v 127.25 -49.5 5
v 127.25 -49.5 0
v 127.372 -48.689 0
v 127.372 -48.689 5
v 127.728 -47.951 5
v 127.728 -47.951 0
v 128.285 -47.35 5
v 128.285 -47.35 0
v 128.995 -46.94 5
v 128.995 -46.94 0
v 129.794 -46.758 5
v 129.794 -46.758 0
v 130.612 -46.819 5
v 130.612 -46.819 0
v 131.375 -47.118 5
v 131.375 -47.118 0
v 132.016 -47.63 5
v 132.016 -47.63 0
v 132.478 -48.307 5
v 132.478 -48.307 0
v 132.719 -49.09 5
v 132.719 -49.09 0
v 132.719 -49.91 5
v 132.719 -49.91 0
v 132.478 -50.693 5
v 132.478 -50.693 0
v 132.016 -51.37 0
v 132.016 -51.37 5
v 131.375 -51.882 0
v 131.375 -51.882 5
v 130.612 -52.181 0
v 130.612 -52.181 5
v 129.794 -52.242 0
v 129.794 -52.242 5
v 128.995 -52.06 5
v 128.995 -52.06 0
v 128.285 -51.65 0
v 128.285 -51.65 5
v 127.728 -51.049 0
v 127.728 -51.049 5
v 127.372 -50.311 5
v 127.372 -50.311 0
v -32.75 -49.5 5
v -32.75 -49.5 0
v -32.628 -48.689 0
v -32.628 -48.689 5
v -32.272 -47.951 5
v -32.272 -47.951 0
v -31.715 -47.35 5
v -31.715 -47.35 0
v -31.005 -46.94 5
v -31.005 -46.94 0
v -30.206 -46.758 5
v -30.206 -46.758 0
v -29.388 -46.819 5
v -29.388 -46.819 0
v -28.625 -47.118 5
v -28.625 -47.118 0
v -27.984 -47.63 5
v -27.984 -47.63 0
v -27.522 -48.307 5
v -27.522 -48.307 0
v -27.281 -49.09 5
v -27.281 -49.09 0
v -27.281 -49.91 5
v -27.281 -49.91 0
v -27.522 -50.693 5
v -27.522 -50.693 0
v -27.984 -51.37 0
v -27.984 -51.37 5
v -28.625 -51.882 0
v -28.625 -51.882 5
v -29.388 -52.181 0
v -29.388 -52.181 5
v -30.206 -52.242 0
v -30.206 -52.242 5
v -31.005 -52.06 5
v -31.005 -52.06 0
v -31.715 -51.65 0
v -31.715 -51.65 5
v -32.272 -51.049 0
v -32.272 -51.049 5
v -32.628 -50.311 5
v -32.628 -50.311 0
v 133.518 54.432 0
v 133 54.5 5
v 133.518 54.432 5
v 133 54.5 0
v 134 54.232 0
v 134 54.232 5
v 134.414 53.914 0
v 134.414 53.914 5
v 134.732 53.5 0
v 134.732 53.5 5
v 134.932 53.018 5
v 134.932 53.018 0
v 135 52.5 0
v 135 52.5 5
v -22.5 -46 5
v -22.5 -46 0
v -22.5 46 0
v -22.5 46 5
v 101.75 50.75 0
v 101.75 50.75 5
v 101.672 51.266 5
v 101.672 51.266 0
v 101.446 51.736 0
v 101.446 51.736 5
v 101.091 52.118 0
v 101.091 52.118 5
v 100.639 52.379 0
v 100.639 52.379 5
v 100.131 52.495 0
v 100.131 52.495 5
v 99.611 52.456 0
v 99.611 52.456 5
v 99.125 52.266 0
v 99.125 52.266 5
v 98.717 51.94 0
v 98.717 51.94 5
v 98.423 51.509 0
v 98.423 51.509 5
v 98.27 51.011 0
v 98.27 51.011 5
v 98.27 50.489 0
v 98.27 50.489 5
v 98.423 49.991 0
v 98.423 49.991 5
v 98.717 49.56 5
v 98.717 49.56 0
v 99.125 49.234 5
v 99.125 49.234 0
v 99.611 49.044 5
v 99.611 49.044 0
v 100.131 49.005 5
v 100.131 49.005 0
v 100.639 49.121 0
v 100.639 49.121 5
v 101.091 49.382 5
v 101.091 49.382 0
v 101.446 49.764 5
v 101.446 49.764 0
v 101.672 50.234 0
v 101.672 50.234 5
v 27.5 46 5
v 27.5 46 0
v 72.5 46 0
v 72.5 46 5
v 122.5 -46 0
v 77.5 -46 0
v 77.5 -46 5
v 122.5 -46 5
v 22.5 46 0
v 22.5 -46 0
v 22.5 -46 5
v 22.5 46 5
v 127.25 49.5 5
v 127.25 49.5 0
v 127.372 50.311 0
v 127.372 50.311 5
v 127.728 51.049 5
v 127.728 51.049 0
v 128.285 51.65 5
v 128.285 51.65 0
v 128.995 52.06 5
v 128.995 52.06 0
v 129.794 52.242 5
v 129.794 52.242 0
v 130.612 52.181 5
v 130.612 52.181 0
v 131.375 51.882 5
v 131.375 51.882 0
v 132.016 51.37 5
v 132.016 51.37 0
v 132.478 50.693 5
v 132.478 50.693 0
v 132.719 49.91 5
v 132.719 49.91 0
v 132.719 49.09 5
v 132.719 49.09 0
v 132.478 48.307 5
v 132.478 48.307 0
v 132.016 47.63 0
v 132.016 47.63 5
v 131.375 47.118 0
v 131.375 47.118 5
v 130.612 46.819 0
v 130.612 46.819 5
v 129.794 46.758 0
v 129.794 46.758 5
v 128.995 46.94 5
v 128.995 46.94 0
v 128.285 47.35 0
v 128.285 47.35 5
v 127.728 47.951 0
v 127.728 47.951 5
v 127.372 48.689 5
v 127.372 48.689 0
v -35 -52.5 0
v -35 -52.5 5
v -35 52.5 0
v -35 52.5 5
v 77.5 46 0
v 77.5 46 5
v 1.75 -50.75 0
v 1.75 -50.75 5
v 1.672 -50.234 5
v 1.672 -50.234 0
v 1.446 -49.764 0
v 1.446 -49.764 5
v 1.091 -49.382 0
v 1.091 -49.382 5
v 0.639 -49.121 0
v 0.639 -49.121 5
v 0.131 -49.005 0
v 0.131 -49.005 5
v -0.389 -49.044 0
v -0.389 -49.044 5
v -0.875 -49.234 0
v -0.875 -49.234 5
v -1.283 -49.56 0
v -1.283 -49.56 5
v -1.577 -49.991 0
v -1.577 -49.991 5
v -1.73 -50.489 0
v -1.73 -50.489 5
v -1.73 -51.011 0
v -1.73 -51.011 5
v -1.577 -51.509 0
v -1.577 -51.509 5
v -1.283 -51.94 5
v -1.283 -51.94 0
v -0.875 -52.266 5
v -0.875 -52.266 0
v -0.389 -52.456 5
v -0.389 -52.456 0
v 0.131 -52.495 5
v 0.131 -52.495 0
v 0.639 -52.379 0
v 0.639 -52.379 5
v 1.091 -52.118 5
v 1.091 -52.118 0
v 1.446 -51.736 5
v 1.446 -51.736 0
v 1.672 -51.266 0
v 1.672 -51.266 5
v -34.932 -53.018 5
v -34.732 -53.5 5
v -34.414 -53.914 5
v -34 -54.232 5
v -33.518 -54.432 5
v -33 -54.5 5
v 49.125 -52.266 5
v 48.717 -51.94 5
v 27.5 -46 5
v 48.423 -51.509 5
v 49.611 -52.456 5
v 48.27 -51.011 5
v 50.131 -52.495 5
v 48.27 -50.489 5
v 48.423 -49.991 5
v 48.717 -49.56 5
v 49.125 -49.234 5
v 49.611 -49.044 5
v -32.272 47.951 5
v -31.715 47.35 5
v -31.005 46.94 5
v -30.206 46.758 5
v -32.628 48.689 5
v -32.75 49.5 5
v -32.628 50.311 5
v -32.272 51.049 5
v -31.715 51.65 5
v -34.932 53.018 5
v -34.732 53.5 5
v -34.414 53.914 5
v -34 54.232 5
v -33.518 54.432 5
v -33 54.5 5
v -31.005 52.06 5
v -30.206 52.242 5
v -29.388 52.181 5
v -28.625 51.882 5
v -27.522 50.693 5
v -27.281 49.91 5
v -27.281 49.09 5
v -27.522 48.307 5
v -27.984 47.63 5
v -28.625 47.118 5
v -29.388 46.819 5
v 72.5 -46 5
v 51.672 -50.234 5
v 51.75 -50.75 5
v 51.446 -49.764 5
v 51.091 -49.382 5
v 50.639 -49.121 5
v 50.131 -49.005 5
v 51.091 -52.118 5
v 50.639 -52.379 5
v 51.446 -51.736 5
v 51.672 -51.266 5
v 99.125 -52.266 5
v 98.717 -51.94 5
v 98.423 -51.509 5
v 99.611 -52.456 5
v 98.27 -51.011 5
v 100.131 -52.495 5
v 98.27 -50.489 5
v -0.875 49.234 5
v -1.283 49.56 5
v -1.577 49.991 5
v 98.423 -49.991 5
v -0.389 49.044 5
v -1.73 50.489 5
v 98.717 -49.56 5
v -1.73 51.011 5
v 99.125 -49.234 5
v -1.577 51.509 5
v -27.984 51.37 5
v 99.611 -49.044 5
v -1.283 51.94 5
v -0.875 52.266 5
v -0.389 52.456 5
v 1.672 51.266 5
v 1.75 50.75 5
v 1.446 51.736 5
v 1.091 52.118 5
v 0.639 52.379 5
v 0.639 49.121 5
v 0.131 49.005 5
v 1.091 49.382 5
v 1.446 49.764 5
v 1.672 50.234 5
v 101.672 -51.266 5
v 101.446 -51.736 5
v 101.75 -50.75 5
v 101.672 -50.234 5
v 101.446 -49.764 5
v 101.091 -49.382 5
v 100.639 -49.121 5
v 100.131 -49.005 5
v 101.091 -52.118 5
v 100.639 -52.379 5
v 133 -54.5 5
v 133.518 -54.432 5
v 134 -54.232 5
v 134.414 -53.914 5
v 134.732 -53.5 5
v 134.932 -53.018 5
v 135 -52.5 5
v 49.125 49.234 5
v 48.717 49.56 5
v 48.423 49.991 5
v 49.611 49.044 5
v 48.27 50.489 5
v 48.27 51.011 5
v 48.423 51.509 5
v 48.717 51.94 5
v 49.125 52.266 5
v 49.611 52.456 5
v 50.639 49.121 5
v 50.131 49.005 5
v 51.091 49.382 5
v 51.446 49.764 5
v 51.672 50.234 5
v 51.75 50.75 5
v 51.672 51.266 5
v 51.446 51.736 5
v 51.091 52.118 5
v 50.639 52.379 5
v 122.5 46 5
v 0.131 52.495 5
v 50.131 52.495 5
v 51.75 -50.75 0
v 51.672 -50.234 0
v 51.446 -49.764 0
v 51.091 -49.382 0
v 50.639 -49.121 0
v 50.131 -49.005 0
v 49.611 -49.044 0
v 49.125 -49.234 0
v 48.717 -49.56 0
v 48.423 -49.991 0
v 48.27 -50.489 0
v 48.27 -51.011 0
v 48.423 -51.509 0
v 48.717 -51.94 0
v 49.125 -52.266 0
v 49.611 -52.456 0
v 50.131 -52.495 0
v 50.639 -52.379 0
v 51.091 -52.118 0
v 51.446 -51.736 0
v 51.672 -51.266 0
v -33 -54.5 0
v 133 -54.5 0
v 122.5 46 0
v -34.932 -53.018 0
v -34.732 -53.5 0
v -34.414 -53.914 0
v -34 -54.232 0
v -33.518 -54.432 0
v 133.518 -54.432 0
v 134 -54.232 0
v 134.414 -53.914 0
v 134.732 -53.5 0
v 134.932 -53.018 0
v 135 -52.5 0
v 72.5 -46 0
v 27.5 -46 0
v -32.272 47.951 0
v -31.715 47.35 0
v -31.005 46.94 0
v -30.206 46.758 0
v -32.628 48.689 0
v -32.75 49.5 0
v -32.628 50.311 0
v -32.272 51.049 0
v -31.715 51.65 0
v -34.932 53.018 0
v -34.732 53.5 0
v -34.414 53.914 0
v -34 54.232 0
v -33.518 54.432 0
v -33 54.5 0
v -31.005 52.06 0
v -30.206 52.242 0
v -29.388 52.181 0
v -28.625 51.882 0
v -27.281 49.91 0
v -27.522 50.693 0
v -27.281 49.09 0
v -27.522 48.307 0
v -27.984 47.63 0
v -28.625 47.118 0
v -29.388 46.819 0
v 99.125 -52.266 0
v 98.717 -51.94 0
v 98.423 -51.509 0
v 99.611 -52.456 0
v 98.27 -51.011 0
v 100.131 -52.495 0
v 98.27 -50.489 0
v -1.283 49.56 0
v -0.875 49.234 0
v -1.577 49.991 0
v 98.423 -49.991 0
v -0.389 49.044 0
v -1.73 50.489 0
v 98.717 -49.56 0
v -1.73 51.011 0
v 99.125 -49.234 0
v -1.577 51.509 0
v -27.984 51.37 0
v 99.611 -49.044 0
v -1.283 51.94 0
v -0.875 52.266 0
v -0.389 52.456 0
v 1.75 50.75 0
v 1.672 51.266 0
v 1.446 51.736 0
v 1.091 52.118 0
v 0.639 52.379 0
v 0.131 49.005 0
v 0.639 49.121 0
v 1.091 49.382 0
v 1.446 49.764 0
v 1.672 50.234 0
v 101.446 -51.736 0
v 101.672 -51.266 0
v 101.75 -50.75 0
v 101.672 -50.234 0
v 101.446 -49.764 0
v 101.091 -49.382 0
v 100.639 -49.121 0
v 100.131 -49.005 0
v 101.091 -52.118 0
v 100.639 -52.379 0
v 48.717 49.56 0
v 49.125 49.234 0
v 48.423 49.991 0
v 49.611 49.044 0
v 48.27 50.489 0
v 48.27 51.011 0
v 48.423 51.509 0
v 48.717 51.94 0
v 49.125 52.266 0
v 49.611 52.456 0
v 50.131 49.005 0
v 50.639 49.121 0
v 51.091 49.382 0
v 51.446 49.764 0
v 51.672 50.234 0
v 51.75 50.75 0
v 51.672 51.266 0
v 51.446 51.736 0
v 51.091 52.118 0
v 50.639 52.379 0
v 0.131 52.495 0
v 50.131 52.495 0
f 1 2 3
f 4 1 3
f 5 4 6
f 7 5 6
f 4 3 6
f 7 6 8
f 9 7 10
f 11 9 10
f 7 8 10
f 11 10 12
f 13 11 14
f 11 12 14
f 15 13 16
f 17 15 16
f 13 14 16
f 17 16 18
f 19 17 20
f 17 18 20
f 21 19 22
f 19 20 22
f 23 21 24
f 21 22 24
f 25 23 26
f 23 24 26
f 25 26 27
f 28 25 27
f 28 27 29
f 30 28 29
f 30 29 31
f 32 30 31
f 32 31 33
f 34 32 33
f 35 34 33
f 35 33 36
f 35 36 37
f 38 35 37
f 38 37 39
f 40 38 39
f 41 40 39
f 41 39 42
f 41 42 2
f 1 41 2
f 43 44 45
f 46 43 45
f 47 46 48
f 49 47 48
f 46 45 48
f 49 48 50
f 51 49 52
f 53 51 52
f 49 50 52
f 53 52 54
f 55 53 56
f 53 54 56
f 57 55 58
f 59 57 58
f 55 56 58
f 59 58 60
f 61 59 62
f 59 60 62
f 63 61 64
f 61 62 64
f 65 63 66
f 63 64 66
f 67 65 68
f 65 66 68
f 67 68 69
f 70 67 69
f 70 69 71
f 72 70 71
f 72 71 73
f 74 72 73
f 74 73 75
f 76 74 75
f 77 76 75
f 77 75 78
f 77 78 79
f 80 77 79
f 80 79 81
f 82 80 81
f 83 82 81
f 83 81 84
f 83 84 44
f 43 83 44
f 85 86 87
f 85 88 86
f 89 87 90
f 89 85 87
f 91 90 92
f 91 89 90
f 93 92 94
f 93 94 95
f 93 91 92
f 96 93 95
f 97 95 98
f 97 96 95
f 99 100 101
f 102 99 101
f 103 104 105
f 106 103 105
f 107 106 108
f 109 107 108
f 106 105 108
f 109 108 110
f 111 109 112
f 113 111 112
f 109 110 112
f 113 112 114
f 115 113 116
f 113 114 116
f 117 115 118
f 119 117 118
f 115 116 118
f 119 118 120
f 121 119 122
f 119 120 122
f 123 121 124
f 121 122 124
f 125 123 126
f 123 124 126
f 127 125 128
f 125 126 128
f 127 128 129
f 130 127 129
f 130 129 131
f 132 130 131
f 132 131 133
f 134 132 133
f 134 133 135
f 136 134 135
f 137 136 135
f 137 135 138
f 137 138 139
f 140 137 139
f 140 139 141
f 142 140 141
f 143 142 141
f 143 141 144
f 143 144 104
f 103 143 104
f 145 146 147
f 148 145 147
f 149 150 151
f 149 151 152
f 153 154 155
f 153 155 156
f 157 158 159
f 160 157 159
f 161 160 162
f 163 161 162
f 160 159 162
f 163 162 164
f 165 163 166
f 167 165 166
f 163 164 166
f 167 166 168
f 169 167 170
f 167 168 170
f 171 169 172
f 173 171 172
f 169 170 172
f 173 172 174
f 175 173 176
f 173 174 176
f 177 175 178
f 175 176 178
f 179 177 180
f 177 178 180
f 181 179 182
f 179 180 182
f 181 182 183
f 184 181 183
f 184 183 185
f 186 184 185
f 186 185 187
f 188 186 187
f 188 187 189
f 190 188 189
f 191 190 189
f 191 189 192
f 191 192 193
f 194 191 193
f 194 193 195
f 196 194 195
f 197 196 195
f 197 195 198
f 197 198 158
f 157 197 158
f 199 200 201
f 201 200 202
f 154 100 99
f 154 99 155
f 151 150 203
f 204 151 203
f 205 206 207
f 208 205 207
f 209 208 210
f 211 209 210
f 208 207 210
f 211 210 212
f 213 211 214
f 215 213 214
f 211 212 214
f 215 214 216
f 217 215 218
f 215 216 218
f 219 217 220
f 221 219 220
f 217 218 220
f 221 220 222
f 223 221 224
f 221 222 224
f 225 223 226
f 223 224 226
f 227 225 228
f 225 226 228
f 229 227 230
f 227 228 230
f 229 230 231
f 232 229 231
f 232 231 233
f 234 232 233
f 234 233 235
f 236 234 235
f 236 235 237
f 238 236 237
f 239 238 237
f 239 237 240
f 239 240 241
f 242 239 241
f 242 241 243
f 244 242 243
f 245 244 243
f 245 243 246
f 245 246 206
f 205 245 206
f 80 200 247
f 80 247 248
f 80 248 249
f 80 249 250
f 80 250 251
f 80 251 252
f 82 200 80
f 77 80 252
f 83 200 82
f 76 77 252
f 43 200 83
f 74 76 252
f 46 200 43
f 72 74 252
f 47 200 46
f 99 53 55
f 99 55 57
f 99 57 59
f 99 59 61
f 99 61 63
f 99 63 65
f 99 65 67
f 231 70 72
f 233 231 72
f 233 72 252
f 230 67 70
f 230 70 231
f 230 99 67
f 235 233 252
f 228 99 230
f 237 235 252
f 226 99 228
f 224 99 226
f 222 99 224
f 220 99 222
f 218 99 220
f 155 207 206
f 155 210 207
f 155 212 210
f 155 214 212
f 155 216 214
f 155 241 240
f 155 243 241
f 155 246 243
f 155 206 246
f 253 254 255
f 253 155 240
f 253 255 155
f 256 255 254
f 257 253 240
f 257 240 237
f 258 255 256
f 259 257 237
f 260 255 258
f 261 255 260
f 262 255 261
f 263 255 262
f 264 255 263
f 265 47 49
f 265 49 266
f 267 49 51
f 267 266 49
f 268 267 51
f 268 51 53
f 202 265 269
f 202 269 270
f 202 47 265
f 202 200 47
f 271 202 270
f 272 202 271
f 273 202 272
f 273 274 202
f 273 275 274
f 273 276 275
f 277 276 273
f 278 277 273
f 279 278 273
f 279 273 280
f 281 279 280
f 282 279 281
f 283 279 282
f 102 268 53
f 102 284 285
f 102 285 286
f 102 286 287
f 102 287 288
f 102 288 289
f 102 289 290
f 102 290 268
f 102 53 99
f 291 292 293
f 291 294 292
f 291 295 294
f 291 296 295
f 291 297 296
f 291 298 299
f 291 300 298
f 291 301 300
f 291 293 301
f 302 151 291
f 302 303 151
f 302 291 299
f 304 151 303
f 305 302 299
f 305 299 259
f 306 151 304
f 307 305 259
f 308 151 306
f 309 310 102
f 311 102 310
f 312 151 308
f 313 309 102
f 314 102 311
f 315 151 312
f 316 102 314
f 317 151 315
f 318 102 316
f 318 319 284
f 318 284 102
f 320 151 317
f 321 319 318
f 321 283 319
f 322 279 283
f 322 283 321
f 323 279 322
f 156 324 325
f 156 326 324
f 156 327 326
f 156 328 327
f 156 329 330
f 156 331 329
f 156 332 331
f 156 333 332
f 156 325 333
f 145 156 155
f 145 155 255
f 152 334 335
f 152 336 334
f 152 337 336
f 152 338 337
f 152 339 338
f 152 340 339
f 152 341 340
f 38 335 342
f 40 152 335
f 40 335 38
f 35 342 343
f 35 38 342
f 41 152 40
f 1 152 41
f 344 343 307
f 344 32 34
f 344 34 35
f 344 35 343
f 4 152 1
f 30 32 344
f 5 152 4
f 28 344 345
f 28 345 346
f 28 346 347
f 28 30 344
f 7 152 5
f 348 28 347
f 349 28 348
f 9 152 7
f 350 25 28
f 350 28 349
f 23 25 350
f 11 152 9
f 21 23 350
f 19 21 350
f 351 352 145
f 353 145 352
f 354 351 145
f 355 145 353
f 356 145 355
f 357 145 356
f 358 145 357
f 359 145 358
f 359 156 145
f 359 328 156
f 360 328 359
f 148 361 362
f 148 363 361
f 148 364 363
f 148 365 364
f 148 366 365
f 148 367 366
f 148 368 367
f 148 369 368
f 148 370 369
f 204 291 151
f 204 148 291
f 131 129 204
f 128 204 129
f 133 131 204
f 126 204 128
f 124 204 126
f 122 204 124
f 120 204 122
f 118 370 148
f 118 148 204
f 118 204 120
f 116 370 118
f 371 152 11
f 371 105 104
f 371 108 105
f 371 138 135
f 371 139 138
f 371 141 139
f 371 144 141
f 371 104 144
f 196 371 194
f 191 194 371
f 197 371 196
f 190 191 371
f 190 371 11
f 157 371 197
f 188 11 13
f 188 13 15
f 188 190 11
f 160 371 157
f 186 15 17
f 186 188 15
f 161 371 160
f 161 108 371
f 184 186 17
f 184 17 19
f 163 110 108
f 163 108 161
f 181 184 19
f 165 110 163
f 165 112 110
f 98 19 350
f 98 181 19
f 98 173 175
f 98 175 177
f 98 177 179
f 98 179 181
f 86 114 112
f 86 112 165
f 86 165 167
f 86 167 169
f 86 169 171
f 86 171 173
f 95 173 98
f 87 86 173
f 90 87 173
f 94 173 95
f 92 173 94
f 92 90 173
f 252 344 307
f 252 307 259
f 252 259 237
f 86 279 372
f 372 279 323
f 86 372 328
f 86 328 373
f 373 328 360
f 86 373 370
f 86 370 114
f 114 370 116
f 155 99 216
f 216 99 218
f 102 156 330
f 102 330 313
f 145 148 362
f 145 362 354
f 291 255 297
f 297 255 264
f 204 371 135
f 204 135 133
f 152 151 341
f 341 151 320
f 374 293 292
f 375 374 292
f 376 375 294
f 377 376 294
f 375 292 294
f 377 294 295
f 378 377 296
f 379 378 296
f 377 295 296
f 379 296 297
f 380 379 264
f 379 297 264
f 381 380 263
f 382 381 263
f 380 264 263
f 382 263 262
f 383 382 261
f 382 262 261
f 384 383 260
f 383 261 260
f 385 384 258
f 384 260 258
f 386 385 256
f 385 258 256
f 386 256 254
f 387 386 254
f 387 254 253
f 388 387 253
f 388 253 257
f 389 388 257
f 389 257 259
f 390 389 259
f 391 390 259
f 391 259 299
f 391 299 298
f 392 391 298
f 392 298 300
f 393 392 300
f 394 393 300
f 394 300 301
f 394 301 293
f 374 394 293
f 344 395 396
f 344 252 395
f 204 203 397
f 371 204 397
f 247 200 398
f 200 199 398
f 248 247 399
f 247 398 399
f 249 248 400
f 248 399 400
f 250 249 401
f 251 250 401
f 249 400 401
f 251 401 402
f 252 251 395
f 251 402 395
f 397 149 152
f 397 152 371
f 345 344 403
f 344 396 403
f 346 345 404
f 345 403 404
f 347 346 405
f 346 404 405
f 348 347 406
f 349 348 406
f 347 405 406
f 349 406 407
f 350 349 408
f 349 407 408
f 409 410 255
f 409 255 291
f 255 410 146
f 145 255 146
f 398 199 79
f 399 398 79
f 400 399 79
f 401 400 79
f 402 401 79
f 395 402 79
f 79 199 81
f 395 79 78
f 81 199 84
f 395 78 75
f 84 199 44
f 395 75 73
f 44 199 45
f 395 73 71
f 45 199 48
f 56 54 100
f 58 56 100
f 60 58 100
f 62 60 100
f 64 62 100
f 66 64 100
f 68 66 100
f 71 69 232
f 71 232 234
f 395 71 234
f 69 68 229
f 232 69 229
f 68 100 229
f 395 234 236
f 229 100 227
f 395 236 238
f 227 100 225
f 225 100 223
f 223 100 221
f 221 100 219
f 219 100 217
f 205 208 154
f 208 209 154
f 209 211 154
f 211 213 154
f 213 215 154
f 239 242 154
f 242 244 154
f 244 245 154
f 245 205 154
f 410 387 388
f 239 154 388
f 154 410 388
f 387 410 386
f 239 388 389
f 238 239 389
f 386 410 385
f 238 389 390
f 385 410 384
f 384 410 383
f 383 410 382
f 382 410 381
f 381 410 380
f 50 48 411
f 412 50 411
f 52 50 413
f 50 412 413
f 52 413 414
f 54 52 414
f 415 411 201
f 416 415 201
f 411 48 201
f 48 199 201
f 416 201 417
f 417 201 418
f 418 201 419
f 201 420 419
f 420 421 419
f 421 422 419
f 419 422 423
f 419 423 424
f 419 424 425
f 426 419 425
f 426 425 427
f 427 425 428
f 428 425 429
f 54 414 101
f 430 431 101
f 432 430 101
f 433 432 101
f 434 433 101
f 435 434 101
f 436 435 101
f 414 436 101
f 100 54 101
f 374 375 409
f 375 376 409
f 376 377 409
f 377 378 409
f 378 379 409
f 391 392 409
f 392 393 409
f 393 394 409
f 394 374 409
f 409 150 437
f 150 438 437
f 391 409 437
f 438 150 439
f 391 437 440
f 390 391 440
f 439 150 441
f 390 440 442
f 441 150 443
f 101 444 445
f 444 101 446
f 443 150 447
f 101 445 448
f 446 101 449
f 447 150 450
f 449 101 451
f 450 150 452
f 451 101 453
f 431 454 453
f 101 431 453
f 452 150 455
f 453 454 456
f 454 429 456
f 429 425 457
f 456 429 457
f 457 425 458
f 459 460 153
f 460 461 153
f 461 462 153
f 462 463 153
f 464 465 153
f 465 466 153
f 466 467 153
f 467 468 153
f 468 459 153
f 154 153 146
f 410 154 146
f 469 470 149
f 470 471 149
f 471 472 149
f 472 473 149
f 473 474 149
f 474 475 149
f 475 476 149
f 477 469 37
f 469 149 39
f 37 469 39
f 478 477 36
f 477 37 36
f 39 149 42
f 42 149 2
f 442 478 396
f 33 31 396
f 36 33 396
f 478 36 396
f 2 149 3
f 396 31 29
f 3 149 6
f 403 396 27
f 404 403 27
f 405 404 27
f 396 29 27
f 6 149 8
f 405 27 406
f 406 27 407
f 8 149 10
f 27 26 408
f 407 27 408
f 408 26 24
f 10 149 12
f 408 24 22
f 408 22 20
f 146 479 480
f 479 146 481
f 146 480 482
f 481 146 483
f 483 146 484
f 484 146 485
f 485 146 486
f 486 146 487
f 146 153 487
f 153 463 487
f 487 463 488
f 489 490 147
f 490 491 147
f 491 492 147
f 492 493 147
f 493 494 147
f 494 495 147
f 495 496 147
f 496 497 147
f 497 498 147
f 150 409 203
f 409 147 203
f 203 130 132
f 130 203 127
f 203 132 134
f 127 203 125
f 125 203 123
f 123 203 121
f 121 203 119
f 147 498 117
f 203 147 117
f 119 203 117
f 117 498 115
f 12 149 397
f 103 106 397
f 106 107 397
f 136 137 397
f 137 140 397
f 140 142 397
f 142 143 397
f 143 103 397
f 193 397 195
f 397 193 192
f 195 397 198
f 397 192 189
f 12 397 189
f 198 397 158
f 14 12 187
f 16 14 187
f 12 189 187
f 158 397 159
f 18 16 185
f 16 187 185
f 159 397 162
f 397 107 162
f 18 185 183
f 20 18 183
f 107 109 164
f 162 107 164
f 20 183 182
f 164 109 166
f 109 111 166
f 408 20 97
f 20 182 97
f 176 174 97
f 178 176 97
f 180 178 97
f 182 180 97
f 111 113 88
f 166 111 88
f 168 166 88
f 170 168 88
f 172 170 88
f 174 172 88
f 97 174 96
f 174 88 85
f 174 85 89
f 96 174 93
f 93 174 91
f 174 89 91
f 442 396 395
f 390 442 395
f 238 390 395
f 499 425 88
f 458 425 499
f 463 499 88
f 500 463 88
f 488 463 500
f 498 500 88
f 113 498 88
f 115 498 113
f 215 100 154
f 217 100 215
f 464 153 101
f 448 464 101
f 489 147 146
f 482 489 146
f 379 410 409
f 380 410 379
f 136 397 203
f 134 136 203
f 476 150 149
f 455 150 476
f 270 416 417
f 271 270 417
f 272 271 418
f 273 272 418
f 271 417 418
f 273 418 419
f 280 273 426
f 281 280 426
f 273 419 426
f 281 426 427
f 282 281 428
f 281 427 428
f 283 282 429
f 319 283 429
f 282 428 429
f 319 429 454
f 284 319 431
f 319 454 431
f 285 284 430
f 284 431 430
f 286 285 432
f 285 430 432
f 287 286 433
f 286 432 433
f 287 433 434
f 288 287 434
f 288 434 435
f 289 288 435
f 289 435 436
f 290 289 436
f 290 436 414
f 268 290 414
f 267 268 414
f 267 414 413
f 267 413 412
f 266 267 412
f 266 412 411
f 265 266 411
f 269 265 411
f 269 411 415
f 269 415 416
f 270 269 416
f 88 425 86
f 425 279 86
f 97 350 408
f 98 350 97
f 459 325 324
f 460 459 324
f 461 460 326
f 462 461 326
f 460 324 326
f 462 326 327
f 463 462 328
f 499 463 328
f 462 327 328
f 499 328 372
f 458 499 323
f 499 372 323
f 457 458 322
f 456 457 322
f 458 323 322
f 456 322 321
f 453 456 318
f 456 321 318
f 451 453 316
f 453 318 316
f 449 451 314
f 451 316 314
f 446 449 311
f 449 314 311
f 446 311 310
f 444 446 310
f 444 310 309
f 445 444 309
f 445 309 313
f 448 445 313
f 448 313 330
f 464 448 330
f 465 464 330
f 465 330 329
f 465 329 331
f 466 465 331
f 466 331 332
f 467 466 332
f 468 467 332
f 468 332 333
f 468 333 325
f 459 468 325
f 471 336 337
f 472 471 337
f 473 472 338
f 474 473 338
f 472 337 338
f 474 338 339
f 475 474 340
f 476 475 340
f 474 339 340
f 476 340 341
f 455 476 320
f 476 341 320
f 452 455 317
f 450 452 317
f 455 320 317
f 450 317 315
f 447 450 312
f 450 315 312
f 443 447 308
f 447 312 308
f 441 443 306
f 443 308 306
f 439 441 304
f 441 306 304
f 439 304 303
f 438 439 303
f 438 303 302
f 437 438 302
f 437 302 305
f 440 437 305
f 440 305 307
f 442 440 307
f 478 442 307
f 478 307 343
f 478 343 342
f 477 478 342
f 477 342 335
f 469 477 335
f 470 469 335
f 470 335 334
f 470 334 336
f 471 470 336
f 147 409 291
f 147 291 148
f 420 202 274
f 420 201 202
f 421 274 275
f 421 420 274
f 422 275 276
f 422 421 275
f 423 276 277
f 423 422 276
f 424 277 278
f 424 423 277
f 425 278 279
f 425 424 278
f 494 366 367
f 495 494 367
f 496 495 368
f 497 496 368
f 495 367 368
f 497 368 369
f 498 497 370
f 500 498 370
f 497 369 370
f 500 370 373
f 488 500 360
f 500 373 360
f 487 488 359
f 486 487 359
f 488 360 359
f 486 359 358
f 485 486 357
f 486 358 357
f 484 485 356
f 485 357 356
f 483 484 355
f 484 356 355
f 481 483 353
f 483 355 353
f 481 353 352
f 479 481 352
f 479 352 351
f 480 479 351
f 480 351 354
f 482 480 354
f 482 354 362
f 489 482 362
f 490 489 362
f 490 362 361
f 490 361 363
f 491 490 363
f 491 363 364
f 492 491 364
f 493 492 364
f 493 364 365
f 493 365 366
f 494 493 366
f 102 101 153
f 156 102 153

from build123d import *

# Parameters (mm, degrees)
SKETCH1_W            = 55
SKETCH1_H            = 109
SKETCH1_W_2          = 45
SKETCH1_H_2          = 92
BOSS_EXTRUDE1_DEPTH  = 5
SKETCH2_R            = 1.75
CUT_EXTRUDE1_DEPTH   = 62.249489794
LPATTERN1_COUNT      = 3
LPATTERN1_PITCH      = 50
SKETCH3_W            = 7.5
SKETCH3_H            = 109
BOSS_EXTRUDE2_DEPTH  = 5
M5_CLEARANCE_HOLE1_D = 5.5
FILLET1_R            = 2


with BuildPart() as part:
    # Sketch1 → Boss-Extrude1 (new body)
    with BuildSketch(Plane.XY):
        Rectangle(SKETCH1_W, SKETCH1_H)
        Rectangle(SKETCH1_W_2, SKETCH1_H_2, mode=Mode.SUBTRACT)
    extrude(amount=BOSS_EXTRUDE1_DEPTH)

    # Sketch2 → Cut-Extrude1 (cut, through all)
    with BuildSketch(Plane.XY.offset(5)):
        with Locations((0, 50.75)):
            Circle(SKETCH2_R)
        with Locations((0, -50.75)):
            Circle(SKETCH2_R)
    extrude(amount=-CUT_EXTRUDE1_DEPTH, mode=Mode.SUBTRACT)

    # LPattern1: part ×3


with BuildPart() as part_1:
    add(part.part)
    with Locations(*[(i * LPATTERN1_PITCH, 0, 0) for i in range(1, LPATTERN1_COUNT)]):
        add(part.part)

    # Sketch3 → Boss-Extrude2 (add)
    with BuildSketch(Plane.XY.offset(5)):
        with Locations((-31.25, 0)):
            Rectangle(SKETCH3_W, SKETCH3_H)
        with Locations((131.25, 0)):
            Rectangle(SKETCH3_W, SKETCH3_H)
    extrude(amount=-BOSS_EXTRUDE2_DEPTH)

    # M5 Clearance Hole1 (through all)
    with Locations(Plane.XY.offset(5)):
        with Locations((-30, 49.5), (130, 49.5), (130, -49.5), (-30, -49.5)):
            Hole(M5_CLEARANCE_HOLE1_D / 2)

    # Fillet1
    fillet1_edges = [part_1.edges().sort_by_distance(p)[0] for p in [
        (-35, -54.5, 2.5),
        (-35, 54.5, 2.5),
        (135, 54.5, 2.5),
        (135, -54.5, 2.5),
    ]]
    fillet(fillet1_edges, radius=FILLET1_R)


solid = part_1.part
